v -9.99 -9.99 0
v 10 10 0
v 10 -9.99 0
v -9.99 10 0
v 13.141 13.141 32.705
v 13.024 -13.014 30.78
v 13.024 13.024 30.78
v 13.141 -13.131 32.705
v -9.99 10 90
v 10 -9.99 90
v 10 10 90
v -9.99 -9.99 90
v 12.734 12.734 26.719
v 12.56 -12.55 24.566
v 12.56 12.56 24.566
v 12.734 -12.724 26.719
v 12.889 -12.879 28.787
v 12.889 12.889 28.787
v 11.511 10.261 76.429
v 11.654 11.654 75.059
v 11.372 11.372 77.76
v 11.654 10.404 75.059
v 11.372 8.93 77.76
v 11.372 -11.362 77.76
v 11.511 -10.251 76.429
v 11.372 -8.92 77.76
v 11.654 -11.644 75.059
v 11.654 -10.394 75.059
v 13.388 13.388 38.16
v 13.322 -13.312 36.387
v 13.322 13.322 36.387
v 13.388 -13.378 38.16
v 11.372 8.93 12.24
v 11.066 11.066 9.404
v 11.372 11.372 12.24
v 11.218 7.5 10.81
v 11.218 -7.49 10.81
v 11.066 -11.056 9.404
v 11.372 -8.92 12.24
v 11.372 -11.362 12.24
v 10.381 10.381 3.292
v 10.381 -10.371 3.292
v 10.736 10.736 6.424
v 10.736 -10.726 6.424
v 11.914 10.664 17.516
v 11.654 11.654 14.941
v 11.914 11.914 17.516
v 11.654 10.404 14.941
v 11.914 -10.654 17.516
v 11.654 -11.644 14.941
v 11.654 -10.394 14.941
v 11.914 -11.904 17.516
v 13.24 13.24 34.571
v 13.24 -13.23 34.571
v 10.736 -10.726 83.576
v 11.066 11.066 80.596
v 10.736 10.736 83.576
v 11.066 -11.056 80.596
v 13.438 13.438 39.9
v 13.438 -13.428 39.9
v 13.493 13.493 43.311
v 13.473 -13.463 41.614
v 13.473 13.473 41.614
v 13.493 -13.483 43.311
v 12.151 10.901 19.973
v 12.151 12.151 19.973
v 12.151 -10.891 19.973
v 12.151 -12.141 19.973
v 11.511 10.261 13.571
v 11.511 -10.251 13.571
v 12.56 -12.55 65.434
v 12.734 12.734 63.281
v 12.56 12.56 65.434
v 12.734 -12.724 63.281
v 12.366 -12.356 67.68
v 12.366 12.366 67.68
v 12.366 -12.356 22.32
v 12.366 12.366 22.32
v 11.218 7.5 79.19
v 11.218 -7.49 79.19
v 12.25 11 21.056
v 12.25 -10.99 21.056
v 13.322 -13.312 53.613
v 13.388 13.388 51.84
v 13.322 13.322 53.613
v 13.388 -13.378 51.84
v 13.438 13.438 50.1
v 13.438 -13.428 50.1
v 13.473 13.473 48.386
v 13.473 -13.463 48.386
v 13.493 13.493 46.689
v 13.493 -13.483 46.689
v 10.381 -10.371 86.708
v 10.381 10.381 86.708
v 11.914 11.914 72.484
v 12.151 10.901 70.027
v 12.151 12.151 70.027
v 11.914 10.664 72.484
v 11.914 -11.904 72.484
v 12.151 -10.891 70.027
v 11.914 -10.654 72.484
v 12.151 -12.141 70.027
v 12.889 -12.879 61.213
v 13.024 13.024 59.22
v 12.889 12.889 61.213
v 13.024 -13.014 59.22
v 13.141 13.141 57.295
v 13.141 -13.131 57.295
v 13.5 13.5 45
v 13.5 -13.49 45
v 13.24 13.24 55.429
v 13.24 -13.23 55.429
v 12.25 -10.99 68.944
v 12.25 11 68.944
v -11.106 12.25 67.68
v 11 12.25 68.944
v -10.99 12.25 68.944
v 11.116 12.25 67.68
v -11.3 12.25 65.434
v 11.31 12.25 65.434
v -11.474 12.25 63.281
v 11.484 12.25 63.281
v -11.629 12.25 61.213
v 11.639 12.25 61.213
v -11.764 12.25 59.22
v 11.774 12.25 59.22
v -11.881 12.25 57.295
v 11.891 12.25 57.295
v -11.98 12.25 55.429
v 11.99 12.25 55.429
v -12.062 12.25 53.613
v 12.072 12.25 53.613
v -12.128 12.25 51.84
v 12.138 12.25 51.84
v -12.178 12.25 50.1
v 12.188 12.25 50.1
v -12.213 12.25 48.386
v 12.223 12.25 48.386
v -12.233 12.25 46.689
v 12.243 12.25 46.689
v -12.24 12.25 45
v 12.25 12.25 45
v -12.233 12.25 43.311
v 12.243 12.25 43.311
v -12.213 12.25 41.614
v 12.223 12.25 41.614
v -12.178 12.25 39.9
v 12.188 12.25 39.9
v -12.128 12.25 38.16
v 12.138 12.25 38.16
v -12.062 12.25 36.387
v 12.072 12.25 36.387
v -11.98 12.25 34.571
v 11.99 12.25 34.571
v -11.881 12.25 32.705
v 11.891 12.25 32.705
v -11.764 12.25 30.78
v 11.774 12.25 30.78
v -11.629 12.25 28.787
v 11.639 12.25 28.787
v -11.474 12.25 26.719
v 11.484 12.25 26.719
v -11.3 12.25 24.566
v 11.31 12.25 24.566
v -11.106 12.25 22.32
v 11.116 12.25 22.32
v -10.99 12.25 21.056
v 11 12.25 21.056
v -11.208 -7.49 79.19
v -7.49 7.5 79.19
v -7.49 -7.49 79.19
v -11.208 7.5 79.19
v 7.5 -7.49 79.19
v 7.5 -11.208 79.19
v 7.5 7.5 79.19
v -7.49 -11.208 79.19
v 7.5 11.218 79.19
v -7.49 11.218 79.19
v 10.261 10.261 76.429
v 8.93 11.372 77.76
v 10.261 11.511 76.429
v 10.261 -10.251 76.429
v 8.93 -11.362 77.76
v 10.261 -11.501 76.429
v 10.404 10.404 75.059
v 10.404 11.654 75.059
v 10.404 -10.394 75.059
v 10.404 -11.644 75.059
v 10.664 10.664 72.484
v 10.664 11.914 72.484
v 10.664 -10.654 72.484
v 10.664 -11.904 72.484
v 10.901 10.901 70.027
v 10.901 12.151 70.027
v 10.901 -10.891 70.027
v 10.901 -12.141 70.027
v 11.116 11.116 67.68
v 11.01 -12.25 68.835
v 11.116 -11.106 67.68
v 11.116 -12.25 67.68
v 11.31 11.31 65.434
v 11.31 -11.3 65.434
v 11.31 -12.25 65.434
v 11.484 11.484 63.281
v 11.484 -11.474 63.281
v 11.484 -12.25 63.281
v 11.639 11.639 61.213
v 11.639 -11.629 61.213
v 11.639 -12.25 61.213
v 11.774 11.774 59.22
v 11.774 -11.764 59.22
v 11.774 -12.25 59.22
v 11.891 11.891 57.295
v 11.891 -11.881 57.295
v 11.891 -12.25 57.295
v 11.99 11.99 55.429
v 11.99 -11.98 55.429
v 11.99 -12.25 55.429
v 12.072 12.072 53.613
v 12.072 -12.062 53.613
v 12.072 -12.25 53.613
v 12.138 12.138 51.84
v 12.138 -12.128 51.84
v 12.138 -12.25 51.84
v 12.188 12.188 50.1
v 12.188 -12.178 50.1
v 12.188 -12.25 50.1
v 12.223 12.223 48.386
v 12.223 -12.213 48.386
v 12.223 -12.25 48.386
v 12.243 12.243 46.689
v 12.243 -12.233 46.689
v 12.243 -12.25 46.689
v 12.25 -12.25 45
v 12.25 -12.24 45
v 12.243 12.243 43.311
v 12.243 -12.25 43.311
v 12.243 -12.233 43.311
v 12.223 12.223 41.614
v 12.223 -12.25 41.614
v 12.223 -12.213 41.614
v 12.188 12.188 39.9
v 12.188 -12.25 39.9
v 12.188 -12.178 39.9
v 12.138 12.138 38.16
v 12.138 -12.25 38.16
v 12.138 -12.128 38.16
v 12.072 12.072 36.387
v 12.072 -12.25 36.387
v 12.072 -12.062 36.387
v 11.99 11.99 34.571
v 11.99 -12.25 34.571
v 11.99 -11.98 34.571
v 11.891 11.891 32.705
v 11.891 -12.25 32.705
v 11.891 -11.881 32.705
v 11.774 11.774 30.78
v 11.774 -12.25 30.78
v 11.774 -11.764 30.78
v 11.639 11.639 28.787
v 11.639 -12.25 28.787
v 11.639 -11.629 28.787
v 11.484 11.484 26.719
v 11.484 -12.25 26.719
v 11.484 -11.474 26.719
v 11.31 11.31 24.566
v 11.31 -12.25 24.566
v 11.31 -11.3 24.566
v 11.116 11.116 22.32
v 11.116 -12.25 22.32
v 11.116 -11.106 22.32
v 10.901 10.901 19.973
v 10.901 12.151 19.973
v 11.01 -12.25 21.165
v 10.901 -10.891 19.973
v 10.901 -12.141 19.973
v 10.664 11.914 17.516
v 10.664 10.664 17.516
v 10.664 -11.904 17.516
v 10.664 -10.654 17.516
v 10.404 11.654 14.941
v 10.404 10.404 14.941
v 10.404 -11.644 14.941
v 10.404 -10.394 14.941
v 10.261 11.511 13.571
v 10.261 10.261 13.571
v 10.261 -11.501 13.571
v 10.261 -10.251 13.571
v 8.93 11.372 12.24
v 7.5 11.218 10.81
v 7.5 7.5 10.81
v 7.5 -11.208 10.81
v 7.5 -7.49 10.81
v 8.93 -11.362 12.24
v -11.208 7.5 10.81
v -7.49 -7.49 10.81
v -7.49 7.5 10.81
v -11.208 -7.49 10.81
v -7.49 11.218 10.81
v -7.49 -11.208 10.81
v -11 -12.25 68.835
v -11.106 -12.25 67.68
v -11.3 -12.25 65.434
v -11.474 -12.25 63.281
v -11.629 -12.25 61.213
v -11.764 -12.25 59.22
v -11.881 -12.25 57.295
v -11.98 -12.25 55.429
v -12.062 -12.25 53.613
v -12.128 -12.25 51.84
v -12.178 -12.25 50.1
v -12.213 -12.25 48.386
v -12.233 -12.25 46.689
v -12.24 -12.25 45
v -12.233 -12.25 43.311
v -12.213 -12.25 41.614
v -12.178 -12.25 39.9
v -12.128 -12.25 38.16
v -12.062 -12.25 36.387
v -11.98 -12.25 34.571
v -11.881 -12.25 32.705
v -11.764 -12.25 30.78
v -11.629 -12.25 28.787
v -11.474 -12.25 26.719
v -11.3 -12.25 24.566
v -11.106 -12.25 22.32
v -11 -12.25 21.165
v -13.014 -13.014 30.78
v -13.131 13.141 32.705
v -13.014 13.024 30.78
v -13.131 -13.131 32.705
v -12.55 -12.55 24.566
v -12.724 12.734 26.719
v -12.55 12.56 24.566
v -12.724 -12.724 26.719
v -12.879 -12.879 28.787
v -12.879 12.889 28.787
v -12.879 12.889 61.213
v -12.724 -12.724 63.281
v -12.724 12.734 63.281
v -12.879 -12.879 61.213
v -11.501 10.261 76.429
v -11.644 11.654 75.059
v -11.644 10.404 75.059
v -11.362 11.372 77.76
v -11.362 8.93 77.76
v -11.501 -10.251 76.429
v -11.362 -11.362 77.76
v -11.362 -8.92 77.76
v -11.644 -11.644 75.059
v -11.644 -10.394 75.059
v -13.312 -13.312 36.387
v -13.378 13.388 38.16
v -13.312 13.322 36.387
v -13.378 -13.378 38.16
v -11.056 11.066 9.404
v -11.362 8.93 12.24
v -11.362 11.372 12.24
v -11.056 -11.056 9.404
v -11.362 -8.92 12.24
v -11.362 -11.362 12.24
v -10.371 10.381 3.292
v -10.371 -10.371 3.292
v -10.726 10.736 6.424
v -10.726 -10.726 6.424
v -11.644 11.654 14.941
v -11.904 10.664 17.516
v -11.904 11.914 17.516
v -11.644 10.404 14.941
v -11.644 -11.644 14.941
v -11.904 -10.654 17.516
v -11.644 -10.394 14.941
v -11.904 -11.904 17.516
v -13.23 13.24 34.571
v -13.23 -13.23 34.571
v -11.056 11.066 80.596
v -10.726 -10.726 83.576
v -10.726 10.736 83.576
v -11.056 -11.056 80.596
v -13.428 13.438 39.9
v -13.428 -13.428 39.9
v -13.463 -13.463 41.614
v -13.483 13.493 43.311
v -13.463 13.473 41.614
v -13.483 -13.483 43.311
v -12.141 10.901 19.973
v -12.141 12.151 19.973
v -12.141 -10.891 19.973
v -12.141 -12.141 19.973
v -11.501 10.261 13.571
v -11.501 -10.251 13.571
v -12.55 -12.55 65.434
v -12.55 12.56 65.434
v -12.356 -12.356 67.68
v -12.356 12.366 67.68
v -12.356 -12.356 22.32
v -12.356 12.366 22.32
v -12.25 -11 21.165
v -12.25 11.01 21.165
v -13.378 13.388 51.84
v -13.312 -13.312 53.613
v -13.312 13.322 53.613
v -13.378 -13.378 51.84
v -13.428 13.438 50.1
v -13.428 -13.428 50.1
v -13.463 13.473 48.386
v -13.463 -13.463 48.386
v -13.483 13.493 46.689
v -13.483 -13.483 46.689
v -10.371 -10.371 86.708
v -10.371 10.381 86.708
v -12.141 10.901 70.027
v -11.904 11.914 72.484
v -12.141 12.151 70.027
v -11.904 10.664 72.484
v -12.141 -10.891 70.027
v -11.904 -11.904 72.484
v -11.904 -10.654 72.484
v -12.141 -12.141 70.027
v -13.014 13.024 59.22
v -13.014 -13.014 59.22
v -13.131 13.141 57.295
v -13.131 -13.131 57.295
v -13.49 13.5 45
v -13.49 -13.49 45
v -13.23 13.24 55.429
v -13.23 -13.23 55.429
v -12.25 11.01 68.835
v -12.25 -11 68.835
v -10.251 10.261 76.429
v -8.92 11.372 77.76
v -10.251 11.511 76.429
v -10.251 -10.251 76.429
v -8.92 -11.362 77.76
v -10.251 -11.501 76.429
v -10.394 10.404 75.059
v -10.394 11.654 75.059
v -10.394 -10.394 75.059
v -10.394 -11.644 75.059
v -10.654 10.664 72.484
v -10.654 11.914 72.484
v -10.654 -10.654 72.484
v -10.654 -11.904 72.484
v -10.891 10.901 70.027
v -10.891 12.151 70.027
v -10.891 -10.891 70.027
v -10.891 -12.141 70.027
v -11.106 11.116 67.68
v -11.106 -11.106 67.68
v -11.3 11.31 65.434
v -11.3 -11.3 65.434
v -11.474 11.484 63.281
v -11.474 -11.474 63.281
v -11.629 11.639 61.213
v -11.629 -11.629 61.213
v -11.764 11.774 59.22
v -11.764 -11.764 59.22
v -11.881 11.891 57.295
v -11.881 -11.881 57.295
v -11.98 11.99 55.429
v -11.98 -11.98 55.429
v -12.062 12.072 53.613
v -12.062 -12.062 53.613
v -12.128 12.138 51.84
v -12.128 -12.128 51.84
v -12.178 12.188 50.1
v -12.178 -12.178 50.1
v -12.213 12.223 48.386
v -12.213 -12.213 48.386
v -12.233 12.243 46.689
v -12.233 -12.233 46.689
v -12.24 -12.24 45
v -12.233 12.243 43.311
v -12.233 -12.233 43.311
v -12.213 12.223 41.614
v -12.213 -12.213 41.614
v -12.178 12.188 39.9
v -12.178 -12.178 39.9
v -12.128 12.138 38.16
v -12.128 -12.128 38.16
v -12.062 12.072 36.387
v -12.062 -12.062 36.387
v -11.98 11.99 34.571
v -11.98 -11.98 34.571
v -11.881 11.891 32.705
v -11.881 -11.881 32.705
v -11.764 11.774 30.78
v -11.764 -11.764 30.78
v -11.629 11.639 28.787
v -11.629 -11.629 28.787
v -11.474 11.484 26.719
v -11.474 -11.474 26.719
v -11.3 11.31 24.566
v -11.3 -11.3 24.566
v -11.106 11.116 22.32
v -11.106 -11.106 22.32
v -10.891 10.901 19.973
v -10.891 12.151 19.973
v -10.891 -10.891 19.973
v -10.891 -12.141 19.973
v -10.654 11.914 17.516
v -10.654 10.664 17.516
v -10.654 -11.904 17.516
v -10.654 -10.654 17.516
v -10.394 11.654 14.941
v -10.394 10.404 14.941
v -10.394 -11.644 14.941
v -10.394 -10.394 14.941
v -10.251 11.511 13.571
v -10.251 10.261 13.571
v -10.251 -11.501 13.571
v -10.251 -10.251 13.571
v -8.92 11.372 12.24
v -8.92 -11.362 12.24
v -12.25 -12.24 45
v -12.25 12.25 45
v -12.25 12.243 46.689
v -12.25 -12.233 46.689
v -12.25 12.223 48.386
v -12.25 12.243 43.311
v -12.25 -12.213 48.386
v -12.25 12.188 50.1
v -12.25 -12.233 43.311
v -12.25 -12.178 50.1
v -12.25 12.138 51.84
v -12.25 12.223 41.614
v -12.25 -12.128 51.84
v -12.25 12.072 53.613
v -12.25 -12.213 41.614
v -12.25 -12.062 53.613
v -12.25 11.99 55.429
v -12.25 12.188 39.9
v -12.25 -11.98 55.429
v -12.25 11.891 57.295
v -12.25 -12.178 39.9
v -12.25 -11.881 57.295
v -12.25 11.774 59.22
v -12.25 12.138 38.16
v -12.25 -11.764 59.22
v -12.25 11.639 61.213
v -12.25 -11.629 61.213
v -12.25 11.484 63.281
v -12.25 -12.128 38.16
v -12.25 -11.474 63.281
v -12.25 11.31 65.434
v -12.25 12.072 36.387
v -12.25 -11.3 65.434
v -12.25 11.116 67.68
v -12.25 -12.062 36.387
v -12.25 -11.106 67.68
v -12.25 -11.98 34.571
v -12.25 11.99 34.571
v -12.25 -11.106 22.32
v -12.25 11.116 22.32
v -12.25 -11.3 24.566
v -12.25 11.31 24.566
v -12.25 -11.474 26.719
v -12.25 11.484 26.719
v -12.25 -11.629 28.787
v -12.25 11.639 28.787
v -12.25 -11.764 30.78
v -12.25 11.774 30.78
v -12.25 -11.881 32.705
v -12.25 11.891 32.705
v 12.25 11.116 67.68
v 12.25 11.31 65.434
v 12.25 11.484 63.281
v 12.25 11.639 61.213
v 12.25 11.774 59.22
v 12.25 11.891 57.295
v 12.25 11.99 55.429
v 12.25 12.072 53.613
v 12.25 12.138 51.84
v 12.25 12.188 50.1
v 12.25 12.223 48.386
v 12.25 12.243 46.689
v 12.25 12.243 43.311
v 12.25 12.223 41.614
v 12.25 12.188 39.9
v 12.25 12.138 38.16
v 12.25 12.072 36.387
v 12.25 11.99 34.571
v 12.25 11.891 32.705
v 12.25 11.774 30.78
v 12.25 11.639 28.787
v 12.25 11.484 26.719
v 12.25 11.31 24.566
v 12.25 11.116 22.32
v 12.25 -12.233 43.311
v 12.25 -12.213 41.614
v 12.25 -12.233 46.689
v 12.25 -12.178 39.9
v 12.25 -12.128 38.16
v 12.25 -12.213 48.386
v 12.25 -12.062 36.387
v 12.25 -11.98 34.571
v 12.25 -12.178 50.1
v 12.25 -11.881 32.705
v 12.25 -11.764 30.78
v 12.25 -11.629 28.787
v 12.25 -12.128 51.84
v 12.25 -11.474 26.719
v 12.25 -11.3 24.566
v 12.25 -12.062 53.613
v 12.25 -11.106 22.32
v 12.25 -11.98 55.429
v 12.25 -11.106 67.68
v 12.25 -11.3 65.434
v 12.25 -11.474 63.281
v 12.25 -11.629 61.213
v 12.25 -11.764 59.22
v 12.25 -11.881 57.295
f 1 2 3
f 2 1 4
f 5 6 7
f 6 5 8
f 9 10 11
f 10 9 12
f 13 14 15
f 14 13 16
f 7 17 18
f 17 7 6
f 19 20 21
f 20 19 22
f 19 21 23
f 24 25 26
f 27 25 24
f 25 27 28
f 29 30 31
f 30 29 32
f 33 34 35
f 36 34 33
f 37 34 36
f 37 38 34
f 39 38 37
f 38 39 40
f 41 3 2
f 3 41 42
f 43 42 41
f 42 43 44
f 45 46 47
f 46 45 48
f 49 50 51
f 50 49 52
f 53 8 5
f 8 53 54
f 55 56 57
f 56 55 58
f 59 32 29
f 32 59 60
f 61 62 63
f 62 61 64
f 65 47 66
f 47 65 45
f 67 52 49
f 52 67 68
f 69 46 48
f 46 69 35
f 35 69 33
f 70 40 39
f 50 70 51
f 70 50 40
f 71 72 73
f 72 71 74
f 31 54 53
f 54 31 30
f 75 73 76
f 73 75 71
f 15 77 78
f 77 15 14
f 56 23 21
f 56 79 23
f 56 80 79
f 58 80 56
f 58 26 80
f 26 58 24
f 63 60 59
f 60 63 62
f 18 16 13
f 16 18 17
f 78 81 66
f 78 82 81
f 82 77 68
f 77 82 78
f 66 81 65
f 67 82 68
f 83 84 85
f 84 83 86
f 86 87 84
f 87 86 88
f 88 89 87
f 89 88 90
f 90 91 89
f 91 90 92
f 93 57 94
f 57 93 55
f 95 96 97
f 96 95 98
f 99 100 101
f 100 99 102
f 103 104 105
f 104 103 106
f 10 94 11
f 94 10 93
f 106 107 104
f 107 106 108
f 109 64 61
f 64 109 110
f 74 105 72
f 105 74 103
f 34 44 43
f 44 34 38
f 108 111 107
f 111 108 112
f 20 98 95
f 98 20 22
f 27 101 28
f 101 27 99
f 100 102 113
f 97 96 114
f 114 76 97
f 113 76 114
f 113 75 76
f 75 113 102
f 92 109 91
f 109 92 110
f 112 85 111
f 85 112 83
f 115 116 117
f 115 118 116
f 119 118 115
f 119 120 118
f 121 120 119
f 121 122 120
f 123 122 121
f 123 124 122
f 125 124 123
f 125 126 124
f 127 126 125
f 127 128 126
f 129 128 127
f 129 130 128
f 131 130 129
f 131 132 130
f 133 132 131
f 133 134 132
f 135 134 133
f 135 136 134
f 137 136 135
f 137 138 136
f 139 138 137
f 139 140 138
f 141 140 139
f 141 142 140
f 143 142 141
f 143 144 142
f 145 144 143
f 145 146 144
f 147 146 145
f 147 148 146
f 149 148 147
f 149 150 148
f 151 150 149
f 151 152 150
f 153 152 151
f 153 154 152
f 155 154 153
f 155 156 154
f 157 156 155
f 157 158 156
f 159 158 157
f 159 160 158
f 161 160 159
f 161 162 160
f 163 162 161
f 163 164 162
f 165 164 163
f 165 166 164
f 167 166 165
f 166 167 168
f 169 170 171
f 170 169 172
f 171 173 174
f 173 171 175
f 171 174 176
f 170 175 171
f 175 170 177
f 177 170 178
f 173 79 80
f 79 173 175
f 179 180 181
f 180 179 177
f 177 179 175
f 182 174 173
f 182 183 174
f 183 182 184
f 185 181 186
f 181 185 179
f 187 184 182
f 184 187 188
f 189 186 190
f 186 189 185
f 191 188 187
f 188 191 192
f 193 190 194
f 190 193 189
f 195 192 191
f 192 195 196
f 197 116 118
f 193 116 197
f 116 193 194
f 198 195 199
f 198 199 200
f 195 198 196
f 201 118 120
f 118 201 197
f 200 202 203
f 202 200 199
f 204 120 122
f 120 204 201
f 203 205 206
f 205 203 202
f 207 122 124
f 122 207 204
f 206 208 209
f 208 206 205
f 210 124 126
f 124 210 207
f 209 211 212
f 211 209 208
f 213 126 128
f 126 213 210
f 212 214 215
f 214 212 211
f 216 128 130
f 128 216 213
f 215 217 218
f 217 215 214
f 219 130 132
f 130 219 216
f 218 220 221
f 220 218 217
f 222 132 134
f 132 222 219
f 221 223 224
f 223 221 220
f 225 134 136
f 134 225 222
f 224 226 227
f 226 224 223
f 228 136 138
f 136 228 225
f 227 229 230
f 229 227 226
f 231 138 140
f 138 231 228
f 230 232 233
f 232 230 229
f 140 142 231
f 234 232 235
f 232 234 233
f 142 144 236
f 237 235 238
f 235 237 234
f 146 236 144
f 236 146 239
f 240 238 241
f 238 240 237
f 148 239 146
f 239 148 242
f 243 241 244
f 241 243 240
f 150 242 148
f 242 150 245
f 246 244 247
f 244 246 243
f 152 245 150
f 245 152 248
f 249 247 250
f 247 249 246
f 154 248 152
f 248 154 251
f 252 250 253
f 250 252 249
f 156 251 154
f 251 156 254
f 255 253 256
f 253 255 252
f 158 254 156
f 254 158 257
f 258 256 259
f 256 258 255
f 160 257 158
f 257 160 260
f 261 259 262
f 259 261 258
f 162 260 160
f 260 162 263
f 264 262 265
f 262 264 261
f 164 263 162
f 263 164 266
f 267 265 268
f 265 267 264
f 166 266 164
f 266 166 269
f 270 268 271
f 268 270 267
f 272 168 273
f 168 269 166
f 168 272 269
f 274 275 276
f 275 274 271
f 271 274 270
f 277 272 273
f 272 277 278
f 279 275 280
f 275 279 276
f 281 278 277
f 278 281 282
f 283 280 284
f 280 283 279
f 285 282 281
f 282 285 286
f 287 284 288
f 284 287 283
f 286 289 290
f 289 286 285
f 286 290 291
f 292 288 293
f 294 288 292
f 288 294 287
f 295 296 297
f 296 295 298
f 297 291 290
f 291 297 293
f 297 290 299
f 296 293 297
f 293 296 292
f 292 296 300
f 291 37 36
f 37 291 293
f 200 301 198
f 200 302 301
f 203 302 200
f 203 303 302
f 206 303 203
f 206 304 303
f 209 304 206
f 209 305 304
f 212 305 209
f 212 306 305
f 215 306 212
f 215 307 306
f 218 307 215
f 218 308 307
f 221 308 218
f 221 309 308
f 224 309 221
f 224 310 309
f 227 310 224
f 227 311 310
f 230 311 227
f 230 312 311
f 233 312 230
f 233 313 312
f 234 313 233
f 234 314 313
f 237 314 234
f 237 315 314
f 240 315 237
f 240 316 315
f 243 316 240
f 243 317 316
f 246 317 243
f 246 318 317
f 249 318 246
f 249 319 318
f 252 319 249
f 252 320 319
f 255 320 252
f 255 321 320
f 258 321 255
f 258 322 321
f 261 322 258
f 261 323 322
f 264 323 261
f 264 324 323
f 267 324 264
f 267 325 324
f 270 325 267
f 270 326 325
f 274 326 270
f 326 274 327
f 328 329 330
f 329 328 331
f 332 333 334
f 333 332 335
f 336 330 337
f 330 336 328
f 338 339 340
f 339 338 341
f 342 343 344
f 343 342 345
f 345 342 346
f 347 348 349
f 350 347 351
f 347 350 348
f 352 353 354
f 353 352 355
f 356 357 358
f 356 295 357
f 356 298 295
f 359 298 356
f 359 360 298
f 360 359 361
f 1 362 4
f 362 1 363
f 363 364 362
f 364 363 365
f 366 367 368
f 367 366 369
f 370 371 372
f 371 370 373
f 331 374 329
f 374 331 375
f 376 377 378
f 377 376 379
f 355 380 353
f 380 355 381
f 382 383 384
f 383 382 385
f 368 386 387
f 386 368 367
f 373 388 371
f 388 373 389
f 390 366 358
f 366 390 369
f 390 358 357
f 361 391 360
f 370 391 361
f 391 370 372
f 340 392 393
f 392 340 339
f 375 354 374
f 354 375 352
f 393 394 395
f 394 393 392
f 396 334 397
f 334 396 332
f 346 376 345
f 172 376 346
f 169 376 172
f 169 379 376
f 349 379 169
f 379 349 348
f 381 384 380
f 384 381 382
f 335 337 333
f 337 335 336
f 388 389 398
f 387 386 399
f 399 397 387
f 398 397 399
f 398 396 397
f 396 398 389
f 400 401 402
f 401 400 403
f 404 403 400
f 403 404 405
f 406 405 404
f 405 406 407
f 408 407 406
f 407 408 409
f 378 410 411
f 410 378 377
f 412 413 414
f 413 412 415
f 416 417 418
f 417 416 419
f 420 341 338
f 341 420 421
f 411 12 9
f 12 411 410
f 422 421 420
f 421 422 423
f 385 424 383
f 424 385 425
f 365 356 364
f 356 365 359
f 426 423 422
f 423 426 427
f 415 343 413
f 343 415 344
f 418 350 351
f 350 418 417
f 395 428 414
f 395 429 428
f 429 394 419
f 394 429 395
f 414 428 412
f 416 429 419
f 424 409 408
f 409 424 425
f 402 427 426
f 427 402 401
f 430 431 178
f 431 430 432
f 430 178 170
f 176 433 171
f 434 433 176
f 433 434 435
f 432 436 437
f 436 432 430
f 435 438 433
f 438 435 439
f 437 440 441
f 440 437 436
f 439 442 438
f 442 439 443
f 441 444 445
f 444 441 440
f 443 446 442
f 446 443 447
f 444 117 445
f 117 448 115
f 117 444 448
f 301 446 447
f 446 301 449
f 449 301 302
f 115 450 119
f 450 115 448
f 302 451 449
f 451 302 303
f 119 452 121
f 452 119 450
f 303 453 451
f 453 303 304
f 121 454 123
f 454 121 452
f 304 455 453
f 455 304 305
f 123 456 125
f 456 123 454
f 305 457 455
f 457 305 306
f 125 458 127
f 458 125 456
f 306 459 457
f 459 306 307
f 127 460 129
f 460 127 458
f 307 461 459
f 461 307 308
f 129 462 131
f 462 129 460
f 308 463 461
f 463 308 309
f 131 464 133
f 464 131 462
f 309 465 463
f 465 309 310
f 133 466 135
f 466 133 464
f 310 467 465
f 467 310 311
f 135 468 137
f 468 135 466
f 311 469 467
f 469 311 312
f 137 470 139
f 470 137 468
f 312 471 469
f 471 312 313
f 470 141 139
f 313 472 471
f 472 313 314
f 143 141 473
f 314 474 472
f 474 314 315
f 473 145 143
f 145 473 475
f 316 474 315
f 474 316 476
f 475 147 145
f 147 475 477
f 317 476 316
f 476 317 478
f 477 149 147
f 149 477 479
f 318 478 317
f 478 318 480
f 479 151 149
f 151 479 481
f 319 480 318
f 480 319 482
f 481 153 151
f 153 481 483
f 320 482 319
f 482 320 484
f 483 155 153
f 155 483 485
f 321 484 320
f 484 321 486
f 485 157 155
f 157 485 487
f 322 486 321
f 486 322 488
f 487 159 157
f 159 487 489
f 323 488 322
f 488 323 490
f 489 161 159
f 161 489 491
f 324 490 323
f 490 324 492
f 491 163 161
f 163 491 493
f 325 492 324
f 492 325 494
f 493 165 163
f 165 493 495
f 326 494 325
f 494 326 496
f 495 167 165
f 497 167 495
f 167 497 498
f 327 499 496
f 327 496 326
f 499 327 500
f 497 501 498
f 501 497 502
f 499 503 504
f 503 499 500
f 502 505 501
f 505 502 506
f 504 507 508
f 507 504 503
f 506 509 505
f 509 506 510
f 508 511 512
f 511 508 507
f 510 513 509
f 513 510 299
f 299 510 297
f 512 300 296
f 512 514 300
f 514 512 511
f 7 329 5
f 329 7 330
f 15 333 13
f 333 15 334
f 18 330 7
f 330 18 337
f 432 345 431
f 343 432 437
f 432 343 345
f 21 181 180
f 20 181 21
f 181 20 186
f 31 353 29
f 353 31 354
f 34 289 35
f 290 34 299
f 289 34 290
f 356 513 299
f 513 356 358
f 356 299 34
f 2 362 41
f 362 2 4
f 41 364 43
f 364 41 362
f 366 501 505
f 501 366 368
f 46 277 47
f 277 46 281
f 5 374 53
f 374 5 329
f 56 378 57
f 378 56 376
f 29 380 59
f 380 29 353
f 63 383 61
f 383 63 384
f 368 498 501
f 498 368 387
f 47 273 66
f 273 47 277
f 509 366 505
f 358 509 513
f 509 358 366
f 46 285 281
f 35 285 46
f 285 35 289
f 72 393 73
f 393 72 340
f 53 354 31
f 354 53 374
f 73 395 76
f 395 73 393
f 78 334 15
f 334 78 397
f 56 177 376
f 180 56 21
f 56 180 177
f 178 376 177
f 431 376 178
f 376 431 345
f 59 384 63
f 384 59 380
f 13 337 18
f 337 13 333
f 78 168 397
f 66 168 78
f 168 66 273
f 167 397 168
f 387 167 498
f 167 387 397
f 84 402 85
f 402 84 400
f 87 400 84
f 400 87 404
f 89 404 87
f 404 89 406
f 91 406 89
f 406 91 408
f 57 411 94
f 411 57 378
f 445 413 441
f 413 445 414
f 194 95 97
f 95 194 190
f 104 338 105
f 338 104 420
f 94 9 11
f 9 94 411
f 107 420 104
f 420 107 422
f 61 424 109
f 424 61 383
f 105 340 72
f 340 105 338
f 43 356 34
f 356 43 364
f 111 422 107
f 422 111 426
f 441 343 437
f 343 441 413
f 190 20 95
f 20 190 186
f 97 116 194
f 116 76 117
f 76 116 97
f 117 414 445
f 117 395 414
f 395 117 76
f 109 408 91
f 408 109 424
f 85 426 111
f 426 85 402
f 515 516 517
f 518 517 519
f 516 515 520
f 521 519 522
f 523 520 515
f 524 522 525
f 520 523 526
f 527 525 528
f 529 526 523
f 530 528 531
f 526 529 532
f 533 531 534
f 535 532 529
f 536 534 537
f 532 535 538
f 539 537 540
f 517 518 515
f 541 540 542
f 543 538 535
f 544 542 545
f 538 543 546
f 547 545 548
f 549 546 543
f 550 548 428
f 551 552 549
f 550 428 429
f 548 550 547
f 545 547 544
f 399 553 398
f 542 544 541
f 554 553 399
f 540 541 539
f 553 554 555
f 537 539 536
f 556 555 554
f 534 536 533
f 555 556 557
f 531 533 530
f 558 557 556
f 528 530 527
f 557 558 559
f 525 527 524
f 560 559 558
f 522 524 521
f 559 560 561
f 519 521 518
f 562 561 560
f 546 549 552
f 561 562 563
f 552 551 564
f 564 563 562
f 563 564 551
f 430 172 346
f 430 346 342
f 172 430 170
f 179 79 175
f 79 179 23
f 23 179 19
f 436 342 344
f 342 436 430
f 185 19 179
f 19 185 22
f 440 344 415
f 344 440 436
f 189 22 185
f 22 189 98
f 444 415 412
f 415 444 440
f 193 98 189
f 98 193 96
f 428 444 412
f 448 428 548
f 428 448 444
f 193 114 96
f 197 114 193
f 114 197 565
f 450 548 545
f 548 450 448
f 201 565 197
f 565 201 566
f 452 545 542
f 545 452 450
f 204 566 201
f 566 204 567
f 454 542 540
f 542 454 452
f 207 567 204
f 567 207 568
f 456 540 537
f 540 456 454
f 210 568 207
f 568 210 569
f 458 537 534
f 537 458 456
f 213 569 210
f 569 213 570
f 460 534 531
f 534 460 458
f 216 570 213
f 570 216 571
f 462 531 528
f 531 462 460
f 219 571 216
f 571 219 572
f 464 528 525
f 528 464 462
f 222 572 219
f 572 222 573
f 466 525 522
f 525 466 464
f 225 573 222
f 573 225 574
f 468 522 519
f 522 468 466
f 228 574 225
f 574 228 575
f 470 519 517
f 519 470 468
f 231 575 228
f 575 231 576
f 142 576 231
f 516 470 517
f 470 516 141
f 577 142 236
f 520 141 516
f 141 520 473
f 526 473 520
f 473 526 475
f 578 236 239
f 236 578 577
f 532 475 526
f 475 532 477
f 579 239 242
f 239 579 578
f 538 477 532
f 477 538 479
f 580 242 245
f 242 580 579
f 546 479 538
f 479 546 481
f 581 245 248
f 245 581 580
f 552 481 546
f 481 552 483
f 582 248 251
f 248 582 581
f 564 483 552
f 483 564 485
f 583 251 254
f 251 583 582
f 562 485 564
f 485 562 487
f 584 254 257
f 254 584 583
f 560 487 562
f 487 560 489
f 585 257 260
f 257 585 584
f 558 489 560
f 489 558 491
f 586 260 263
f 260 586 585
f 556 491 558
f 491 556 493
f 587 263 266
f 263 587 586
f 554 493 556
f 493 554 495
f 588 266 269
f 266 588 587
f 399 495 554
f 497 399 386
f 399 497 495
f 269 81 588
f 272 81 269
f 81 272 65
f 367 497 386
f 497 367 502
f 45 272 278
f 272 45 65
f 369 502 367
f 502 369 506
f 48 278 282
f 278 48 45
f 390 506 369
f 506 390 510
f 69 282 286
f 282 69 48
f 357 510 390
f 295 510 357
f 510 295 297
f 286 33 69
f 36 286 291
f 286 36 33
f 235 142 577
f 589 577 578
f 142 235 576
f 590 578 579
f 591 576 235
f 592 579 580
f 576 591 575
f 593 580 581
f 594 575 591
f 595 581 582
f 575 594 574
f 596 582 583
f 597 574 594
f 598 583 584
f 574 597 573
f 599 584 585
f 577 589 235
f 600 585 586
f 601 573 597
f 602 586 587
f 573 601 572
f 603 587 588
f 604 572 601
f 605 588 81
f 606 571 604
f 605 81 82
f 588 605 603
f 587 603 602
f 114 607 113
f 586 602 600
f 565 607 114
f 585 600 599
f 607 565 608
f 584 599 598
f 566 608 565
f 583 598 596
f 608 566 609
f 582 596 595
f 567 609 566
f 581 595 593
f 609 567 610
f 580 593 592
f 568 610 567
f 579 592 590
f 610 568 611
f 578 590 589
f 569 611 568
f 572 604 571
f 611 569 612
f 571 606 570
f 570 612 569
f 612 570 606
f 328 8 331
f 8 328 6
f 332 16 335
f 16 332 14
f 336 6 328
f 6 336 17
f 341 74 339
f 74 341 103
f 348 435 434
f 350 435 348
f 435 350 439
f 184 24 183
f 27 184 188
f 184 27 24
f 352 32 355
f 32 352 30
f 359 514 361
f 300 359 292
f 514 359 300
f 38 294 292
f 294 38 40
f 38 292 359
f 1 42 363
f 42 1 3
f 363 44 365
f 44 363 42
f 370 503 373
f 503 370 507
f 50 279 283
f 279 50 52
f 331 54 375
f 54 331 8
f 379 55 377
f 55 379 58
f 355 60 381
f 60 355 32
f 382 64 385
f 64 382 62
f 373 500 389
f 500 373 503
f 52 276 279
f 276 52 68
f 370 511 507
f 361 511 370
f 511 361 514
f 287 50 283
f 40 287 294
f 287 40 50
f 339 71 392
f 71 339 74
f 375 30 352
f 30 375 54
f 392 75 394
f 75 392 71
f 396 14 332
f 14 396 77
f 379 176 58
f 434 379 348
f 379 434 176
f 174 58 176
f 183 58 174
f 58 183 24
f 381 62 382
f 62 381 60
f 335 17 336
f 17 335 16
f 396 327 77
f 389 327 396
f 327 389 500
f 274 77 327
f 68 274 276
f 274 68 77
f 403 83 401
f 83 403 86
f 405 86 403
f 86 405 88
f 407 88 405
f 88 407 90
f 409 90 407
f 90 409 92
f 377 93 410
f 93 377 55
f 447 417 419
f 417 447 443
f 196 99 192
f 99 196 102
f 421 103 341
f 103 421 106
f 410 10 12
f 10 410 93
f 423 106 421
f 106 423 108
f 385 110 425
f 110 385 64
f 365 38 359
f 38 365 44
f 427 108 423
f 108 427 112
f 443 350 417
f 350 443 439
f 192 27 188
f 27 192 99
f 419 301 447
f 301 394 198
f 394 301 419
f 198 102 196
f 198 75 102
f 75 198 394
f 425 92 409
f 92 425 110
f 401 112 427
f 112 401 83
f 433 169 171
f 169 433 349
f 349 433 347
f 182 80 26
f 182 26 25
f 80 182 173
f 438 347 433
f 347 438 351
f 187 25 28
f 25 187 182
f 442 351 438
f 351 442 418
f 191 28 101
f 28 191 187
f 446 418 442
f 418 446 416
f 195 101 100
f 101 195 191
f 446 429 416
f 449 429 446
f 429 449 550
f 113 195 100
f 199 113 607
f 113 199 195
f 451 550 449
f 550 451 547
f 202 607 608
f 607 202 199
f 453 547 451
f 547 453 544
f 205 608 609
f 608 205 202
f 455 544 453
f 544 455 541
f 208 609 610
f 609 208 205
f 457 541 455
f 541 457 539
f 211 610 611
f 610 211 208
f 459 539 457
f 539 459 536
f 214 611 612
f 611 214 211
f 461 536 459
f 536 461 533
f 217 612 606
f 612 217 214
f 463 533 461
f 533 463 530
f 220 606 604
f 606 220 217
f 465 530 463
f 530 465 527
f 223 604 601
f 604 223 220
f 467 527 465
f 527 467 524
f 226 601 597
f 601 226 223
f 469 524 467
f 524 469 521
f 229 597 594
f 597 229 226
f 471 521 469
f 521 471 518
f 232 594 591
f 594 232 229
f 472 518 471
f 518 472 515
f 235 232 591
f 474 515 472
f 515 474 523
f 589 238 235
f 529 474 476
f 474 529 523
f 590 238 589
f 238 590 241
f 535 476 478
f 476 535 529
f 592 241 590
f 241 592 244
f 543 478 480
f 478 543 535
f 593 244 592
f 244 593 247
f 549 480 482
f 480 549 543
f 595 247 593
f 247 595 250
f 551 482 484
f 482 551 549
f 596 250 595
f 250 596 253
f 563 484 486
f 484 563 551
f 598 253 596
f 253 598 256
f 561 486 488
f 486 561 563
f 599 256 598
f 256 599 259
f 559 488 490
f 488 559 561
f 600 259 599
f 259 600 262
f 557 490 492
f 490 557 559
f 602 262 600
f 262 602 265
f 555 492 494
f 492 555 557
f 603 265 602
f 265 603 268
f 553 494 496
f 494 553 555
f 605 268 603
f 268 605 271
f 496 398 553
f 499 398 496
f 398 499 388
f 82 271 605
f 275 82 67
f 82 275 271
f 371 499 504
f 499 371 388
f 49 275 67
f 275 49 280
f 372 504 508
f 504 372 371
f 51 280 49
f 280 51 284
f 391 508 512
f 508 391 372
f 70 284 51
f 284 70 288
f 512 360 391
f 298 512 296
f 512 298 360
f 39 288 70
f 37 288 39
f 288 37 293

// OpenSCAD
// file: bezier.scad
/* 
Copyright (c) 2017 Alexander R. Pruss.

Licensed under any Creative Commons Attribution license you like or under the 
following MIT License.

Permission is hereby granted, free of charge, to any person obtaining a copy
of this software and associated documentation files (the "Software"), to deal
in the Software without restriction, including without limitation the rights
to use, copy, modify, merge, publish, distribute, sublicense, and/or sell
copies of the Software, and to permit persons to whom the Software is
furnished to do so, subject to the following conditions:

The above copyright notice and this permission notice shall be included in all
copies or substantial portions of the Software.

THE SOFTWARE IS PROVIDED "AS IS", WITHOUT WARRANTY OF ANY KIND, EXPRESS OR
IMPLIED, INCLUDING BUT NOT LIMITED TO THE WARRANTIES OF MERCHANTABILITY,
FITNESS FOR A PARTICULAR PURPOSE AND NONINFRINGEMENT. IN NO EVENT SHALL THE
AUTHORS OR COPYRIGHT HOLDERS BE LIABLE FOR ANY CLAIM, DAMAGES OR OTHER
LIABILITY, WHETHER IN AN ACTION OF CONTRACT, TORT OR OTHERWISE, ARISING FROM,
OUT OF OR IN CONNECTION WITH THE SOFTWARE OR THE USE OR OTHER DEALINGS IN THE
SOFTWARE. 

*/


// Public domain Bezier stuff from www.thingiverse.com/thing:8443
function BEZ03(u) = pow((1-u), 3);
function BEZ13(u) = 3*u*(pow((1-u),2));
function BEZ23(u) = 3*(pow(u,2))*(1-u);
function BEZ33(u) = pow(u,3);
function PointAlongBez4(p0, p1, p2, p3, u) = [
	BEZ03(u)*p0[0]+BEZ13(u)*p1[0]+BEZ23(u)*p2[0]+BEZ33(u)*p3[0],
	BEZ03(u)*p0[1]+BEZ13(u)*p1[1]+BEZ23(u)*p2[1]+BEZ33(u)*p3[1]];
// End public domain Bezier stuff

function SMOOTH_REL(x) = ["r",x];
function SMOOTH_ABS(x) = ["a",x];
function SYMMETRIC() = ["r",1];
function OFFSET(v) = ["o",v];
function SHARP() = OFFSET([0,0]);
function POLAR(r,angle) = OFFSET(r*[cos(angle),sin(angle)]);
function POINT_IS_SPECIAL(v) = (v[0]=="r" || v[0]=="a" || v[0]=="o");

function normalize2D(v) = v / sqrt(v[0]*v[0]+v[1]*v[1]);

// this does NOT handle offset type points; to handle those, use DecodeBezierOffsets()
function getControlPoint(cp,node,otherCP) = cp[0]=="r"?(node+cp[1]*(node-otherCP)):( cp[0]=="a"?node+cp[1]*normalize2D(node-otherCP):cp );

function Bezier2(p,index=0,precision=0.05,rightEndPoint=true) = let(nPoints=ceil(1/precision)) [for (i=[0:nPoints-(rightEndPoint?0:1)]) PointAlongBez4(p[index+0],p[index+1],p[index+2],p[index+3],i/nPoints)];
    
function flatten(listOfLists) = [ for(list = listOfLists) for(item = list) item ];


// p is a list of points, in the format:
// [node1,control1,control2,node2,control3, control4,node3, ...]
// You can replace inner control points with:
//   SYMMETRIC: uses a reflection of the control point on the other side of the node
//   SMOOTH_REL(x): like SYMMETRIC, but the distance of the control point to the node is x times the distance of the other control point to the node
//   SMOOTH_ABS(x): like SYMMETRIC, but the distance of the control point to the node is exactly x
// You can also replace any control point with:
//   OFFSET(v): puts the control point at the corresponding node plus the vector v
//   SHARP(): equivalent to OFFSET([0,0]); useful for straight lines
//   POLAR(r,angle): like OFFSET, except the offset is specified in polar coordinates

function DecodeBezierOffset(control,node) = control[0] == "o" ? node+control[1] : control;

// replace all OFFSET/SHARP/POLAR points with coordinates
function DecodeBezierOffsets(p) = [for (i=[0:len(p)-1]) i%3==0?p[i]:(i%3==1?DecodeBezierOffset(p[i],p[i-1]):DecodeBezierOffset(p[i],p[i+1]))];

function DecodeSpecialBezierPoints(p0) = let(p=DecodeBezierOffsets(p0)) [for (i=[0:len(p)-1]) i%3==0?p[i]:(i%3==1?getControlPoint(p[i],p[i-1],p[i-2]):getControlPoint(p[i],p[i+1],p[i+2]))];

function Distance2D(a,b) = sqrt((a[0]-b[0])*(a[0]-b[0])+(a[1]-b[1])*(a[1]-b[1]));

function RemoveDuplicates(p,eps=0.00001) = let(safeEps = eps/len(p)) [for (i=[0:len(p)-1]) if(i==0 || i==len(p)-1 || Distance2D(p[i-1],p[i]) >= safeEps) p[i]];

function Bezier(p,precision=0.05,eps=0.00001) = let(q=DecodeSpecialBezierPoints(p), nodes=(len(p)-1)/3) RemoveDuplicates(flatten([for (i=[0:nodes-1]) Bezier2(q,index=i*3,precision=precision,rightEndPoint=(i==nodes-1))]),eps=eps);

//<skip>
linear_extrude(height=5) {
polygon(Bezier([[0,0],/*C*/[5,0],/*C*/SYMMETRIC(),[10,10],/*C*/[15,10],/*C*/OFFSET([-5,0]),[20,0]],precision=0.05));
translate([0,15])
polygon(Bezier([[0,0],/*C*/[5,0],/*C*/SMOOTH_REL(2),[10,10],/*C*/[15,10],/*C*/POLAR(5,180),[20,0]],precision=0.05));
translate([0,30])
polygon(Bezier([[0,0],/*C*/[5,0],/*C*/SMOOTH_ABS(1.5),[10,10],/*C*/[15,10],/*C*/OFFSET([-5,0]),[20,0]],precision=0.05));
translate([0,45])
polygon(Bezier([[0,0],/*C*/[5,0],/*C*/SMOOTH_REL(-1),[10,10],/*C*/[15,10],/*C*/OFFSET([-5,0]),[20,0]],precision=0.05));
translate([0,60])
polygon(Bezier([[0,0],/*C*/[5,0],/*C*/SMOOTH_ABS(-1),[10,10],/*C*/[15,10],/*C*/OFFSET([-5,0]),[20,0]],precision=0.05));
translate([0,75])
polygon(Bezier([[0,0],/*C*/SHARP(),/*C*/SHARP(),[10,10],/*C*/SHARP(),/*C*/OFFSET([-5,0]),[20,0]],precision=0.05));
}
//</skip>
// main file
use <bezier.scad>;

//<params>
tipDiameter = 20;
centerDiameter = 27;
height = 90;
// default 1.5
chamferSize = 0;
// fraction of total height occupied by each solid end cap 
endCapFraction = 0.12; 
// default 1.25
wallThickness = 1.25;
maxBridgeLength = 15;
// set to non-zero to print a slab version
slabWidth = 27;
squareCrossSection = true;

// height for weight capsule (if used, stop printing here and insert weights)
weightCapsuleHeight = 0; 
weightCapsuleDiameter = 15;
weightCapsuleNumberOfSides = 30;
weightCapsuleOffsetFromTip = 3;

module dummy() {}
//</params>

nudge = 0.01;
endCapSize = max(endCapFraction*height, weightCapsuleHeight > 0 ? weightCapsuleHeight+weightCapsuleOffsetFromTip+2 : 0);

module pinCrossSection(tipDiameter=tipDiameter, centerDiameter=centerDiameter, height=height) {
    tipR = tipDiameter / 2;
    centerR = centerDiameter / 2;

    bezierPointsTop = [
      [0,height],/*C*/OFFSET([1,0]),OFFSET([-1,0]), 
      /*N*/[tipR-chamferSize,height],
      /*C*/SMOOTH_ABS(chamferSize*0.5), 
      /*C*/SMOOTH_ABS(chamferSize*0.5), 
      /*N*/[tipR,height-chamferSize], 
      [tipR*0.25+centerR*0.75,0.75*height], [centerR,0.625*height], [centerR,0.5*height]];
    function flip(v) = [v[0],height-v[1]];
    fixedTop = DecodeSpecialBezierPoints(bezierPointsTop);
    bezierPointsBottom = [ for(i=[1:len(fixedTop)-1]) let(j=len(fixedTop)-1-i) flip(fixedTop[j]) ];
    bezierPoints = concat(bezierPointsTop,bezierPointsBottom);
    polygon(Bezier(bezierPoints));
}

module pin(tipDiameter=tipDiameter, centerDiameter=centerDiameter, height=height, $fn=$fn) {
    rotate_extrude() crossSection(tipDiameter=tipDiameter, centerDiameter=centerDiameter, height=height);
}

module insidePinCrossSection() {
    $fn = 16;
    
    maxDiameter = max(tipDiameter,centerDiameter);

    cylinderHeight = maxBridgeLength < maxDiameter ? 0.5*(maxDiameter-maxBridgeLength) : 0;
    
    module antiBridgingCylinder() {
        if (maxBridgeLength < maxDiameter) {
            translate([0,-cylinderHeight])
            polygon([[0,0],[maxDiameter/2,0],[maxBridgeLength/2,cylinderHeight],[0,cylinderHeight]]);
        }
    }
    
        intersection() {
            pinCrossSection(tipDiameter=tipDiameter-2*wallThickness, centerDiameter=centerDiameter-2*wallThickness);
            union() {
                translate([-maxDiameter/2,endCapSize+cylinderHeight]) square([maxDiameter,height-2*endCapSize-2*cylinderHeight]);
                translate([0,height-endCapSize-nudge])
                    antiBridgingCylinder();
                translate([0,endCapSize+nudge])
                mirror([0,1]) antiBridgingCylinder();
            }
        }
}

module crossSection() {
    $fn = 60;
    difference() {
        pinCrossSection();
        insidePinCrossSection();
    }
}

module oneSideSlab(slabWidth=slabWidth) {
    linear_extrude(height=wallThickness) pinCrossSection();
    linear_extrude(height = slabWidth)
        crossSection();
    translate([0,0,slabWidth-wallThickness])
    linear_extrude(height=wallThickness) pinCrossSection();
}

render(convexity=1)
if (squareCrossSection) {
    intersection() {
        translate([0,centerDiameter/2,0]) 
        rotate([90,0,0]) {
                oneSideSlab(slabWidth=centerDiameter);
                translate([nudge,0,0]) mirror([1,0,0]) oneSideSlab(slabWidth=centerDiameter);
        }
        translate([-centerDiameter/2,0,0]) 
        rotate([0,0,90]) rotate([90,0,0]) {
                oneSideSlab(slabWidth=centerDiameter);
                translate([nudge,0,0]) mirror([1,0,0]) oneSideSlab(slabWidth=centerDiameter);
        }
    }
}
else if (slabWidth>0) {
    rotate([90,0,0]) {
        oneSideSlab();
        translate([nudge,0,0]) mirror([1,0,0]) oneSideSlab();
    }
}
else {
    difference() {
        rotate_extrude($fn=60) crossSection();
        if (weightCapsuleHeight>0) {
            translate([0,0,weightCapsuleOffsetFromTip])
                cylinder(h=weightCapsuleHeight,d=weightCapsuleDiameter,$fn=weightCapsuleNumberOfSides);
            translate([0,0,height-weightCapsuleOffsetFromTip-weightCapsuleHeight])
                cylinder(h=weightCapsuleHeight,d=weightCapsuleDiameter,$fn=weightCapsuleNumberOfSides);
        }
    }
}
